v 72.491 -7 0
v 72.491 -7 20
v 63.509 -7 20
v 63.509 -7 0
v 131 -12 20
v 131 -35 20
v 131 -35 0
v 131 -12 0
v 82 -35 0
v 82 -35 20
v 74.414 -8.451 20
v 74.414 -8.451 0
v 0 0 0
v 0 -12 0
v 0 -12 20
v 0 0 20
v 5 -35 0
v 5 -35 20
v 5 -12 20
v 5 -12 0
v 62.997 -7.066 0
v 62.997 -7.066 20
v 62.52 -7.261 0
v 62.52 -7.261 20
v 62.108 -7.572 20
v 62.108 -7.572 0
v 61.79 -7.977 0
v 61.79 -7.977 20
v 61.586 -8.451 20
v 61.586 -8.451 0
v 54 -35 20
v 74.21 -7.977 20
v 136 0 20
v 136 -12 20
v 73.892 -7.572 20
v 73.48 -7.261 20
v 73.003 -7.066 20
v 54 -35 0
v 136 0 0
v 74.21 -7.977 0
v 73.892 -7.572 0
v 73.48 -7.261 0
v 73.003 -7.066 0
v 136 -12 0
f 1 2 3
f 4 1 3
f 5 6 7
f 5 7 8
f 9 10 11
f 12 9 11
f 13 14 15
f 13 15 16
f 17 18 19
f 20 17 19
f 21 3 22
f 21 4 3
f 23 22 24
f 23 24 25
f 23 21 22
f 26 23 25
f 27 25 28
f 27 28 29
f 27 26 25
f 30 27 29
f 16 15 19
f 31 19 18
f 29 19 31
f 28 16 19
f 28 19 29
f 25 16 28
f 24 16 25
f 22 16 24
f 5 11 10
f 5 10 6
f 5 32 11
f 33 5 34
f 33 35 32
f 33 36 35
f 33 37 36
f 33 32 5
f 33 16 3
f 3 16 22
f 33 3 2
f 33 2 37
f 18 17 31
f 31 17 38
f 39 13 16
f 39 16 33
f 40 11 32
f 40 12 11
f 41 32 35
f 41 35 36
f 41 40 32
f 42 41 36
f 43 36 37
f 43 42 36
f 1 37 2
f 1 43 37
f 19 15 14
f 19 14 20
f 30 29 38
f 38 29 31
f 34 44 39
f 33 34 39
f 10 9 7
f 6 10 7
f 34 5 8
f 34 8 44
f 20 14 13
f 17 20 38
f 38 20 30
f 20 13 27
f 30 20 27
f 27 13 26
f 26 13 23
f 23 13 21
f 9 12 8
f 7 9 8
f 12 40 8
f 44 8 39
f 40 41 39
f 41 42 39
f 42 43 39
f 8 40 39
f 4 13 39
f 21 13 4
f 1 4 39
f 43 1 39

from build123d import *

# Parameters (mm, degrees)
F0_W     = 136
F0_H     = 35
F1_DEPTH = 20
F2_W     = 5
F2_H     = 23
F3_DEPTH = 25
F4_R     = 2


with BuildPart() as f1:
    # F0 (on Top) → F1 (new body)
    with BuildSketch(Plane.XY):
        with Locations((68, -17.5)):
            Rectangle(F0_W, F0_H)
    extrude(amount=F1_DEPTH)

    # F2 (on face) → F3 (cut)
    with BuildSketch(Plane.XY.offset(20)):
        Polygon((68, -7), (62, -7), (54, -35), (82, -35), (74, -7), align=None)
        with Locations((133.5, -23.5)):
            Rectangle(F2_W, F2_H)
        with Locations((2.5, -23.5)):
            Rectangle(F2_W, F2_H)
    extrude(amount=-F3_DEPTH, mode=Mode.SUBTRACT)

    # F4
    f4_edges = [f1.edges().sort_by_distance(p)[0] for p in [
        (62, -7, 10),
        (74, -7, 10),
    ]]
    fillet(f4_edges, radius=F4_R)


solid = f1.part
